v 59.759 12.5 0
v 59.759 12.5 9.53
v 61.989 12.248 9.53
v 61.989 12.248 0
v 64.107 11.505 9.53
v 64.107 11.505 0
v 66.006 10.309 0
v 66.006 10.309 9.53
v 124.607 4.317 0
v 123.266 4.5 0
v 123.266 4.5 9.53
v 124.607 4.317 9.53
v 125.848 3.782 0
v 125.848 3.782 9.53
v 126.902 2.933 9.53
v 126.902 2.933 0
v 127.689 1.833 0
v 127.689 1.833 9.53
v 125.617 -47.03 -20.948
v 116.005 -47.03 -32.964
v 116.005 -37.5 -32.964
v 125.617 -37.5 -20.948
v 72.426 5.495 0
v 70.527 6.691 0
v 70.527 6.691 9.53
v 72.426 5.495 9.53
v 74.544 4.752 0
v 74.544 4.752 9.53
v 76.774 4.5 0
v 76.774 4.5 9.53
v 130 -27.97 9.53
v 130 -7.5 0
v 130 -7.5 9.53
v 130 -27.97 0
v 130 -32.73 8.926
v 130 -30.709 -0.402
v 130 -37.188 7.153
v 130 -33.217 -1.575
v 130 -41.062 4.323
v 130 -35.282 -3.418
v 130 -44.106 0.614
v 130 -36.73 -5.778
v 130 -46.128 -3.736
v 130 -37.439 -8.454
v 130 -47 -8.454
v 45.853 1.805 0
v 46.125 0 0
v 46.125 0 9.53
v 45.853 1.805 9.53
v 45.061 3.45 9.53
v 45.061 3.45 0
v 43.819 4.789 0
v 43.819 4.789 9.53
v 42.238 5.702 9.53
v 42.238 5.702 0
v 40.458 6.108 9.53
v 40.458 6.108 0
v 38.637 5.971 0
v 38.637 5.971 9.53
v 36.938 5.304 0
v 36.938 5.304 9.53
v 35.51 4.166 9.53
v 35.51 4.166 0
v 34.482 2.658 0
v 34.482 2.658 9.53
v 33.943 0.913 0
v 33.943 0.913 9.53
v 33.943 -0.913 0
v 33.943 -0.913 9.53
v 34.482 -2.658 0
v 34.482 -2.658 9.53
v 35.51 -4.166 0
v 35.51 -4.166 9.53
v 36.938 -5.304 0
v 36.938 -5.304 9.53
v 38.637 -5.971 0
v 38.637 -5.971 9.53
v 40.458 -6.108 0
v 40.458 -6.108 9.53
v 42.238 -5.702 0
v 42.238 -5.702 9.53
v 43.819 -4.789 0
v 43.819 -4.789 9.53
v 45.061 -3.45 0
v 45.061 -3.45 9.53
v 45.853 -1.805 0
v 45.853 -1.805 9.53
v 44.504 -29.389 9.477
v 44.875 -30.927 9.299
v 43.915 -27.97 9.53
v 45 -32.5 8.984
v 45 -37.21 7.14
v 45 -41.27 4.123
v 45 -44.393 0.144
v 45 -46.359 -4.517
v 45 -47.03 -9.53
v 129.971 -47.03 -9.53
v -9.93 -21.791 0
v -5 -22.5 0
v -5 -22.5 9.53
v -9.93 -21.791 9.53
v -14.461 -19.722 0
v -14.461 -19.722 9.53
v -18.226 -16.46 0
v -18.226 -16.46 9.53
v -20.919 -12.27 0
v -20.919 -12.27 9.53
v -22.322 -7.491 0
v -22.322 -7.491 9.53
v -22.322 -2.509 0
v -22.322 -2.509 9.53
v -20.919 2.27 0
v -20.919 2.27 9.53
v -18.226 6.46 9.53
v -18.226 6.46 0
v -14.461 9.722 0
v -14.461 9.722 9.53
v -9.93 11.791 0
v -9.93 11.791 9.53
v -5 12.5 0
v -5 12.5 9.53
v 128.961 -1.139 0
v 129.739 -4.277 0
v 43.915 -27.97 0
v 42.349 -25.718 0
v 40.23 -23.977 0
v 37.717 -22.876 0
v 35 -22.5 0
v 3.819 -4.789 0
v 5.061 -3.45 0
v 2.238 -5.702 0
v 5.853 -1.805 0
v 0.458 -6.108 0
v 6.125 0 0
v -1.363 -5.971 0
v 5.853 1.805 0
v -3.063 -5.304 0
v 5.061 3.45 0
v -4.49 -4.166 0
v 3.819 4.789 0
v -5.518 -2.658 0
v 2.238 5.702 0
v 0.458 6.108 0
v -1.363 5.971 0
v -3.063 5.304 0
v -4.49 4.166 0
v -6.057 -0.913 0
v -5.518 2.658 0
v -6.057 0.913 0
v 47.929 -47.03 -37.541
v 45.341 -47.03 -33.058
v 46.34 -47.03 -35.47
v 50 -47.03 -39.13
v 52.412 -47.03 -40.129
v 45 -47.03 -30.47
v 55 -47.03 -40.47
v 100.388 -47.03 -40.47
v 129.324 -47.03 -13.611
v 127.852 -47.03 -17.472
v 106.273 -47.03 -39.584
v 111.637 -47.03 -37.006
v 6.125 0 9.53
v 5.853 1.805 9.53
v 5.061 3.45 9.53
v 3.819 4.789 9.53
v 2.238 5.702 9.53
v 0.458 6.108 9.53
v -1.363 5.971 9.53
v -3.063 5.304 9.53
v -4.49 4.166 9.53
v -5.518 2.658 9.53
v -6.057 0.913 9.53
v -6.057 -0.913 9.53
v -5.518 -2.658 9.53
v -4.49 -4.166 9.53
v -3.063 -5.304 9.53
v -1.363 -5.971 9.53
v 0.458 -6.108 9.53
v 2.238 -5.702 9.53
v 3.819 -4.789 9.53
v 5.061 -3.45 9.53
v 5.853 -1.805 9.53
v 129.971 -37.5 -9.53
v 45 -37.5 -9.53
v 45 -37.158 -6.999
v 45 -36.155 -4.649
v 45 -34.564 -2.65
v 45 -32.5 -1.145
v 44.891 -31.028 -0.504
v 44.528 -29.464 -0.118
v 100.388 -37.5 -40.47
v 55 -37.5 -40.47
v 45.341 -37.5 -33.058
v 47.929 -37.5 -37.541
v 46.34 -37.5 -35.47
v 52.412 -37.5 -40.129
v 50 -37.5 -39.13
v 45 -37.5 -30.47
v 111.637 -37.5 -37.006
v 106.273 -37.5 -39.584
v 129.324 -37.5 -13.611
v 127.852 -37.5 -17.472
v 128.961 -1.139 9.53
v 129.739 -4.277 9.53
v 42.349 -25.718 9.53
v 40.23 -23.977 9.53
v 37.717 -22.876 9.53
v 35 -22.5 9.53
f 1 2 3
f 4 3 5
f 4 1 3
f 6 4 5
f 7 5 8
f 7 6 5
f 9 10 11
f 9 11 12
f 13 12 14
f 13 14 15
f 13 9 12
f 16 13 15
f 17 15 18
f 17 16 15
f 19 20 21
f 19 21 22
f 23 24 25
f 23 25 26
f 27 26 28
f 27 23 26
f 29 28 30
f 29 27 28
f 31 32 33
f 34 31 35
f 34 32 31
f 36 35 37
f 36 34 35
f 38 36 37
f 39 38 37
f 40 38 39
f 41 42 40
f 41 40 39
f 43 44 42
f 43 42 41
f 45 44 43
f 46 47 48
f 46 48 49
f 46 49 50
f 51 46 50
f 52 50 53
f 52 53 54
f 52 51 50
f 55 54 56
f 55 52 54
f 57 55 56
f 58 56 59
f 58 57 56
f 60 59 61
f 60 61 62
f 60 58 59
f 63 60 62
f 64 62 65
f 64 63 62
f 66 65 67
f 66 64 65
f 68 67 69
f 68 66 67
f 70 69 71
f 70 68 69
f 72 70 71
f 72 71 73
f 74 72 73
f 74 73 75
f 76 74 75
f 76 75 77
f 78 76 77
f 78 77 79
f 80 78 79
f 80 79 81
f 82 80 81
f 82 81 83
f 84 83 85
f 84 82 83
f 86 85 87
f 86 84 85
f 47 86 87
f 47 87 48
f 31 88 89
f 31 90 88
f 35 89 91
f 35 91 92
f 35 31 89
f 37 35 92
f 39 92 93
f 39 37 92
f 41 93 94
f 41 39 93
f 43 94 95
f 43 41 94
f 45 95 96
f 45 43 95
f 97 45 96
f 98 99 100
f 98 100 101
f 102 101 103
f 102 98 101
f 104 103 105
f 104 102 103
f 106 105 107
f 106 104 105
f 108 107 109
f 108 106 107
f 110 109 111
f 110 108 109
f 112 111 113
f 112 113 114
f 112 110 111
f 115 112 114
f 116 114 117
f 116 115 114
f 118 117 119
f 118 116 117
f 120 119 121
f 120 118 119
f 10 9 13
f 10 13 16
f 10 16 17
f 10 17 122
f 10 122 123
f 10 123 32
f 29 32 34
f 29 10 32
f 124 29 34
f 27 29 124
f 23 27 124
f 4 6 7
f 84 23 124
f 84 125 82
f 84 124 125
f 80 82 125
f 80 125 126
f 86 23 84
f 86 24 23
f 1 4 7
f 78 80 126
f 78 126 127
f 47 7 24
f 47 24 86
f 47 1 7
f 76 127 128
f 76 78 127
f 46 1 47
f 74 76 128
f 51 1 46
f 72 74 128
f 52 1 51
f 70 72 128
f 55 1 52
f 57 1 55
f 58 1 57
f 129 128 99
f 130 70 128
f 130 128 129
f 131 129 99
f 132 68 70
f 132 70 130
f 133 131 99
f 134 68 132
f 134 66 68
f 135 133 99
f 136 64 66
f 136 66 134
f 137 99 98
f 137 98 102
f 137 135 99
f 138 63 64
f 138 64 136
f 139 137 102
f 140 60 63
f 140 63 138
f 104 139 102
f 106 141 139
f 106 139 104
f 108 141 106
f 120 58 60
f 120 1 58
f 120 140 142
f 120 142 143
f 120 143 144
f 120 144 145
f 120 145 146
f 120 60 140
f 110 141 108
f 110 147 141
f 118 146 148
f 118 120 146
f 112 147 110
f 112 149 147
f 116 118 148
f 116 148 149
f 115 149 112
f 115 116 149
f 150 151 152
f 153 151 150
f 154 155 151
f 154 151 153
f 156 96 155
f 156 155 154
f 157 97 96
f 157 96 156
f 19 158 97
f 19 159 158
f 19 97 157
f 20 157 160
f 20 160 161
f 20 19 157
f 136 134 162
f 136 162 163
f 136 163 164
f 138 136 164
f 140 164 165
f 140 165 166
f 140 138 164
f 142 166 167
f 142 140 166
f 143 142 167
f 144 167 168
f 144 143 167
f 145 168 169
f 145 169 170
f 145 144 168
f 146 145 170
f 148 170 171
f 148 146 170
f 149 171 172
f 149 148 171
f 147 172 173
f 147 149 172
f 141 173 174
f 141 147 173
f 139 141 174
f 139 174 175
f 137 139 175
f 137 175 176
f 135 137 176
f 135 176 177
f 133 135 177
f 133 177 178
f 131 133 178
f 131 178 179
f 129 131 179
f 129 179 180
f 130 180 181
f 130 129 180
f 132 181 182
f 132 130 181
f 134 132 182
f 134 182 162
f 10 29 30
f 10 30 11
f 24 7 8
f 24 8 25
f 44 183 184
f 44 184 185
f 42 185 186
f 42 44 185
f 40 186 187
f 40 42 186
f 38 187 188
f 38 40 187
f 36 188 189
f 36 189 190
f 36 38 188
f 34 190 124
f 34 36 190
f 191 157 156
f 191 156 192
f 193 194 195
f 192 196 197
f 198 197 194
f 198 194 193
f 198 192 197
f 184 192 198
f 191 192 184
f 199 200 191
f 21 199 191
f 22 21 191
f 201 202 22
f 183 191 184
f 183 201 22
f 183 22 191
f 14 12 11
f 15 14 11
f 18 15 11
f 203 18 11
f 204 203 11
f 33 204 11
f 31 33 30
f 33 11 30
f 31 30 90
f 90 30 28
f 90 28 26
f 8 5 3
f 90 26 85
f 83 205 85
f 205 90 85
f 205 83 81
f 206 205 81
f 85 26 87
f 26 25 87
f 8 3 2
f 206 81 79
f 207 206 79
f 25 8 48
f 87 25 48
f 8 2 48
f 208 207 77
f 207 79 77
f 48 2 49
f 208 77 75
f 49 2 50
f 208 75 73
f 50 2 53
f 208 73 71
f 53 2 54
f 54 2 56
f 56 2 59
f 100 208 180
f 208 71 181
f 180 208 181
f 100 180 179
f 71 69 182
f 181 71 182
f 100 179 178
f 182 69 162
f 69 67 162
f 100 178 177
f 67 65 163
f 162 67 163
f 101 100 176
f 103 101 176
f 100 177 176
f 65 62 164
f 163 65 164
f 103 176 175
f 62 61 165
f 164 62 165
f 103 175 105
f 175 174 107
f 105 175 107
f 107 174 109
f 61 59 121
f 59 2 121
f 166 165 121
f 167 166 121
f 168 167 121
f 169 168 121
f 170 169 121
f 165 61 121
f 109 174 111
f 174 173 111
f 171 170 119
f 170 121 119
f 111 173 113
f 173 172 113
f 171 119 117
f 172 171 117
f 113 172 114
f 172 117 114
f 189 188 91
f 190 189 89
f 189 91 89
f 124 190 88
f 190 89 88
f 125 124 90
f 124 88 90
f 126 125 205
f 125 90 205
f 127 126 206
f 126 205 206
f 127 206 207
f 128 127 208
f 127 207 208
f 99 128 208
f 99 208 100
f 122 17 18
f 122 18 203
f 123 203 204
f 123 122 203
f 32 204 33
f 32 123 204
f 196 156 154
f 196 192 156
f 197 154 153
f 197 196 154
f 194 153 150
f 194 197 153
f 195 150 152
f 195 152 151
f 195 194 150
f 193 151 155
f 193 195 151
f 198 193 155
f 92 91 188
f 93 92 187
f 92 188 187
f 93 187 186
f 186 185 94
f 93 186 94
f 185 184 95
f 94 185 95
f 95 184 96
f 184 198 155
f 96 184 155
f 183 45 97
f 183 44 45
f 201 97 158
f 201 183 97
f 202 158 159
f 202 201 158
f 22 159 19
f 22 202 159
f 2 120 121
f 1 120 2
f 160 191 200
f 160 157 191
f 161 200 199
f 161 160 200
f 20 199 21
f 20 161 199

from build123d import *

# Parameters (mm, degrees)
CROQUIS1_R                       = 6.125
SALIENTE_EXTRUIR1_DEPTH          = 9.53
BRIDA_DE_ARISTA1_STRIP_W         = 57.18
BRIDA_DE_ARISTA1_STRIP_H         = 9.53
BRIDA_DE_ARISTA1_STRIP_CUT_DEPTH = 85
BRIDA_DE_ARISTA1_DEPTH           = 85
REDONDEO3_R                      = 10
CHAFL_N1_START                   = 111.176977613
CHAFL_N1_OUTLINE_W               = 35
CHAFL_N1_OUTLINE_H               = 9.53
CHAFL_N1_DEPTH                   = 16.823022387
REDONDEO4_R                      = 20


with BuildPart() as part:
    # Croquis1 → Saliente-Extruir1 (new body)
    with BuildSketch(Plane.XY):
        with BuildLine():
            Line((-5, 12.5), (59.758688568, 12.5))
            ThreePointArc((59.758688568, 12.5), (63.068757982, 11.936283192), (66.005639043, 10.308688094))
            Line((66.005639043, 10.308688094), (70.527359279, 6.691311906))
            ThreePointArc((70.527359279, 6.691311906), (73.464240341, 5.063716808), (76.774309755, 4.5))
            Line((76.774309755, 4.5), (123.266499161, 4.5))
            ThreePointArc((123.266499161, 4.5), (125.848488059, 3.781744193), (127.688665549, 1.833333333))
            ThreePointArc((127.688665549, 1.833333333), (129.41356885, -2.692366017), (130, -7.5))
            Line((130, -7.5), (130, -37.5))
            Line((130, -37.5), (45, -37.5))
            Line((45, -37.5), (45, -22.5))
            Line((45, -22.5), (-5, -22.5))
            ThreePointArc((-5, -22.5), (-22.5, -5), (-5, 12.5))
        make_face()
        Circle(CROQUIS1_R, mode=Mode.SUBTRACT)
        with Locations((40, 0)):
            Circle(CROQUIS1_R, mode=Mode.SUBTRACT)
    extrude(amount=SALIENTE_EXTRUIR1_DEPTH)

    # Brida de arista1: sheet metal written as solids
    # Brida de arista1 strip (on a plane across the edge) → Brida de arista1 strip cut (cut)
    with BuildSketch(Plane(origin=(130, -37.5, 0), x_dir=(0, 1, 0), z_dir=(-1, 0, 0))):
        with Locations((-19.06, -4.765)):
            Rectangle(BRIDA_DE_ARISTA1_STRIP_W, BRIDA_DE_ARISTA1_STRIP_H)
    extrude(amount=BRIDA_DE_ARISTA1_STRIP_CUT_DEPTH, mode=Mode.SUBTRACT)

    # Brida de arista1 section (on a plane across the edge) → Brida de arista1 (add)
    with BuildSketch(Plane(origin=(130, -37.5, 0), x_dir=(0, 1, 0), z_dir=(-1, 0, 0))):
        with BuildLine():
            Line((-9.53, 9.53), (-9.53, 40.47))
            Line((-9.53, 40.47), (0, 40.47))
            Line((0, 40.47), (0, 9.53))
            ThreePointArc((0, 9.53), (2.791272375, 2.791272375), (9.53, 0))
            Line((9.53, 0), (9.53, -9.53))
            ThreePointArc((9.53, -9.53), (-3.947455249, -3.947455249), (-9.53, 9.53))
        make_face()
    extrude(amount=BRIDA_DE_ARISTA1_DEPTH)

    # Redondeo3
    redondeo3_edges = [part.edges().sort_by_distance(p)[0] for p in [
        (45, -22.5, 4.765),
        (45, -42.265, -40.47),
    ]]
    fillet(redondeo3_edges, radius=REDONDEO3_R)

    # Chaflán1: read off the stored shape, not the designer's step
    # Chaflán1 outline → Chaflán1 (cut)
    with BuildSketch(Plane(origin=(0, 0, 0), x_dir=(0.6246950475544231, 0, 0.7808688094430313), z_dir=(0.7808688094430313, 0, -0.6246950475544232)).offset(CHAFL_N1_START)):
        with Locations((53.5, 42.265)):
            Rectangle(CHAFL_N1_OUTLINE_W, CHAFL_N1_OUTLINE_H)
    extrude(amount=CHAFL_N1_DEPTH, mode=Mode.SUBTRACT)

    # Redondeo4
    redondeo4_edges = [part.edges().sort_by_distance(p)[0] for p in [
        (110, -42.265, -40.47),
        (130, -42.265, -15.47),
    ]]
    fillet(redondeo4_edges, radius=REDONDEO4_R)


solid = part.part
